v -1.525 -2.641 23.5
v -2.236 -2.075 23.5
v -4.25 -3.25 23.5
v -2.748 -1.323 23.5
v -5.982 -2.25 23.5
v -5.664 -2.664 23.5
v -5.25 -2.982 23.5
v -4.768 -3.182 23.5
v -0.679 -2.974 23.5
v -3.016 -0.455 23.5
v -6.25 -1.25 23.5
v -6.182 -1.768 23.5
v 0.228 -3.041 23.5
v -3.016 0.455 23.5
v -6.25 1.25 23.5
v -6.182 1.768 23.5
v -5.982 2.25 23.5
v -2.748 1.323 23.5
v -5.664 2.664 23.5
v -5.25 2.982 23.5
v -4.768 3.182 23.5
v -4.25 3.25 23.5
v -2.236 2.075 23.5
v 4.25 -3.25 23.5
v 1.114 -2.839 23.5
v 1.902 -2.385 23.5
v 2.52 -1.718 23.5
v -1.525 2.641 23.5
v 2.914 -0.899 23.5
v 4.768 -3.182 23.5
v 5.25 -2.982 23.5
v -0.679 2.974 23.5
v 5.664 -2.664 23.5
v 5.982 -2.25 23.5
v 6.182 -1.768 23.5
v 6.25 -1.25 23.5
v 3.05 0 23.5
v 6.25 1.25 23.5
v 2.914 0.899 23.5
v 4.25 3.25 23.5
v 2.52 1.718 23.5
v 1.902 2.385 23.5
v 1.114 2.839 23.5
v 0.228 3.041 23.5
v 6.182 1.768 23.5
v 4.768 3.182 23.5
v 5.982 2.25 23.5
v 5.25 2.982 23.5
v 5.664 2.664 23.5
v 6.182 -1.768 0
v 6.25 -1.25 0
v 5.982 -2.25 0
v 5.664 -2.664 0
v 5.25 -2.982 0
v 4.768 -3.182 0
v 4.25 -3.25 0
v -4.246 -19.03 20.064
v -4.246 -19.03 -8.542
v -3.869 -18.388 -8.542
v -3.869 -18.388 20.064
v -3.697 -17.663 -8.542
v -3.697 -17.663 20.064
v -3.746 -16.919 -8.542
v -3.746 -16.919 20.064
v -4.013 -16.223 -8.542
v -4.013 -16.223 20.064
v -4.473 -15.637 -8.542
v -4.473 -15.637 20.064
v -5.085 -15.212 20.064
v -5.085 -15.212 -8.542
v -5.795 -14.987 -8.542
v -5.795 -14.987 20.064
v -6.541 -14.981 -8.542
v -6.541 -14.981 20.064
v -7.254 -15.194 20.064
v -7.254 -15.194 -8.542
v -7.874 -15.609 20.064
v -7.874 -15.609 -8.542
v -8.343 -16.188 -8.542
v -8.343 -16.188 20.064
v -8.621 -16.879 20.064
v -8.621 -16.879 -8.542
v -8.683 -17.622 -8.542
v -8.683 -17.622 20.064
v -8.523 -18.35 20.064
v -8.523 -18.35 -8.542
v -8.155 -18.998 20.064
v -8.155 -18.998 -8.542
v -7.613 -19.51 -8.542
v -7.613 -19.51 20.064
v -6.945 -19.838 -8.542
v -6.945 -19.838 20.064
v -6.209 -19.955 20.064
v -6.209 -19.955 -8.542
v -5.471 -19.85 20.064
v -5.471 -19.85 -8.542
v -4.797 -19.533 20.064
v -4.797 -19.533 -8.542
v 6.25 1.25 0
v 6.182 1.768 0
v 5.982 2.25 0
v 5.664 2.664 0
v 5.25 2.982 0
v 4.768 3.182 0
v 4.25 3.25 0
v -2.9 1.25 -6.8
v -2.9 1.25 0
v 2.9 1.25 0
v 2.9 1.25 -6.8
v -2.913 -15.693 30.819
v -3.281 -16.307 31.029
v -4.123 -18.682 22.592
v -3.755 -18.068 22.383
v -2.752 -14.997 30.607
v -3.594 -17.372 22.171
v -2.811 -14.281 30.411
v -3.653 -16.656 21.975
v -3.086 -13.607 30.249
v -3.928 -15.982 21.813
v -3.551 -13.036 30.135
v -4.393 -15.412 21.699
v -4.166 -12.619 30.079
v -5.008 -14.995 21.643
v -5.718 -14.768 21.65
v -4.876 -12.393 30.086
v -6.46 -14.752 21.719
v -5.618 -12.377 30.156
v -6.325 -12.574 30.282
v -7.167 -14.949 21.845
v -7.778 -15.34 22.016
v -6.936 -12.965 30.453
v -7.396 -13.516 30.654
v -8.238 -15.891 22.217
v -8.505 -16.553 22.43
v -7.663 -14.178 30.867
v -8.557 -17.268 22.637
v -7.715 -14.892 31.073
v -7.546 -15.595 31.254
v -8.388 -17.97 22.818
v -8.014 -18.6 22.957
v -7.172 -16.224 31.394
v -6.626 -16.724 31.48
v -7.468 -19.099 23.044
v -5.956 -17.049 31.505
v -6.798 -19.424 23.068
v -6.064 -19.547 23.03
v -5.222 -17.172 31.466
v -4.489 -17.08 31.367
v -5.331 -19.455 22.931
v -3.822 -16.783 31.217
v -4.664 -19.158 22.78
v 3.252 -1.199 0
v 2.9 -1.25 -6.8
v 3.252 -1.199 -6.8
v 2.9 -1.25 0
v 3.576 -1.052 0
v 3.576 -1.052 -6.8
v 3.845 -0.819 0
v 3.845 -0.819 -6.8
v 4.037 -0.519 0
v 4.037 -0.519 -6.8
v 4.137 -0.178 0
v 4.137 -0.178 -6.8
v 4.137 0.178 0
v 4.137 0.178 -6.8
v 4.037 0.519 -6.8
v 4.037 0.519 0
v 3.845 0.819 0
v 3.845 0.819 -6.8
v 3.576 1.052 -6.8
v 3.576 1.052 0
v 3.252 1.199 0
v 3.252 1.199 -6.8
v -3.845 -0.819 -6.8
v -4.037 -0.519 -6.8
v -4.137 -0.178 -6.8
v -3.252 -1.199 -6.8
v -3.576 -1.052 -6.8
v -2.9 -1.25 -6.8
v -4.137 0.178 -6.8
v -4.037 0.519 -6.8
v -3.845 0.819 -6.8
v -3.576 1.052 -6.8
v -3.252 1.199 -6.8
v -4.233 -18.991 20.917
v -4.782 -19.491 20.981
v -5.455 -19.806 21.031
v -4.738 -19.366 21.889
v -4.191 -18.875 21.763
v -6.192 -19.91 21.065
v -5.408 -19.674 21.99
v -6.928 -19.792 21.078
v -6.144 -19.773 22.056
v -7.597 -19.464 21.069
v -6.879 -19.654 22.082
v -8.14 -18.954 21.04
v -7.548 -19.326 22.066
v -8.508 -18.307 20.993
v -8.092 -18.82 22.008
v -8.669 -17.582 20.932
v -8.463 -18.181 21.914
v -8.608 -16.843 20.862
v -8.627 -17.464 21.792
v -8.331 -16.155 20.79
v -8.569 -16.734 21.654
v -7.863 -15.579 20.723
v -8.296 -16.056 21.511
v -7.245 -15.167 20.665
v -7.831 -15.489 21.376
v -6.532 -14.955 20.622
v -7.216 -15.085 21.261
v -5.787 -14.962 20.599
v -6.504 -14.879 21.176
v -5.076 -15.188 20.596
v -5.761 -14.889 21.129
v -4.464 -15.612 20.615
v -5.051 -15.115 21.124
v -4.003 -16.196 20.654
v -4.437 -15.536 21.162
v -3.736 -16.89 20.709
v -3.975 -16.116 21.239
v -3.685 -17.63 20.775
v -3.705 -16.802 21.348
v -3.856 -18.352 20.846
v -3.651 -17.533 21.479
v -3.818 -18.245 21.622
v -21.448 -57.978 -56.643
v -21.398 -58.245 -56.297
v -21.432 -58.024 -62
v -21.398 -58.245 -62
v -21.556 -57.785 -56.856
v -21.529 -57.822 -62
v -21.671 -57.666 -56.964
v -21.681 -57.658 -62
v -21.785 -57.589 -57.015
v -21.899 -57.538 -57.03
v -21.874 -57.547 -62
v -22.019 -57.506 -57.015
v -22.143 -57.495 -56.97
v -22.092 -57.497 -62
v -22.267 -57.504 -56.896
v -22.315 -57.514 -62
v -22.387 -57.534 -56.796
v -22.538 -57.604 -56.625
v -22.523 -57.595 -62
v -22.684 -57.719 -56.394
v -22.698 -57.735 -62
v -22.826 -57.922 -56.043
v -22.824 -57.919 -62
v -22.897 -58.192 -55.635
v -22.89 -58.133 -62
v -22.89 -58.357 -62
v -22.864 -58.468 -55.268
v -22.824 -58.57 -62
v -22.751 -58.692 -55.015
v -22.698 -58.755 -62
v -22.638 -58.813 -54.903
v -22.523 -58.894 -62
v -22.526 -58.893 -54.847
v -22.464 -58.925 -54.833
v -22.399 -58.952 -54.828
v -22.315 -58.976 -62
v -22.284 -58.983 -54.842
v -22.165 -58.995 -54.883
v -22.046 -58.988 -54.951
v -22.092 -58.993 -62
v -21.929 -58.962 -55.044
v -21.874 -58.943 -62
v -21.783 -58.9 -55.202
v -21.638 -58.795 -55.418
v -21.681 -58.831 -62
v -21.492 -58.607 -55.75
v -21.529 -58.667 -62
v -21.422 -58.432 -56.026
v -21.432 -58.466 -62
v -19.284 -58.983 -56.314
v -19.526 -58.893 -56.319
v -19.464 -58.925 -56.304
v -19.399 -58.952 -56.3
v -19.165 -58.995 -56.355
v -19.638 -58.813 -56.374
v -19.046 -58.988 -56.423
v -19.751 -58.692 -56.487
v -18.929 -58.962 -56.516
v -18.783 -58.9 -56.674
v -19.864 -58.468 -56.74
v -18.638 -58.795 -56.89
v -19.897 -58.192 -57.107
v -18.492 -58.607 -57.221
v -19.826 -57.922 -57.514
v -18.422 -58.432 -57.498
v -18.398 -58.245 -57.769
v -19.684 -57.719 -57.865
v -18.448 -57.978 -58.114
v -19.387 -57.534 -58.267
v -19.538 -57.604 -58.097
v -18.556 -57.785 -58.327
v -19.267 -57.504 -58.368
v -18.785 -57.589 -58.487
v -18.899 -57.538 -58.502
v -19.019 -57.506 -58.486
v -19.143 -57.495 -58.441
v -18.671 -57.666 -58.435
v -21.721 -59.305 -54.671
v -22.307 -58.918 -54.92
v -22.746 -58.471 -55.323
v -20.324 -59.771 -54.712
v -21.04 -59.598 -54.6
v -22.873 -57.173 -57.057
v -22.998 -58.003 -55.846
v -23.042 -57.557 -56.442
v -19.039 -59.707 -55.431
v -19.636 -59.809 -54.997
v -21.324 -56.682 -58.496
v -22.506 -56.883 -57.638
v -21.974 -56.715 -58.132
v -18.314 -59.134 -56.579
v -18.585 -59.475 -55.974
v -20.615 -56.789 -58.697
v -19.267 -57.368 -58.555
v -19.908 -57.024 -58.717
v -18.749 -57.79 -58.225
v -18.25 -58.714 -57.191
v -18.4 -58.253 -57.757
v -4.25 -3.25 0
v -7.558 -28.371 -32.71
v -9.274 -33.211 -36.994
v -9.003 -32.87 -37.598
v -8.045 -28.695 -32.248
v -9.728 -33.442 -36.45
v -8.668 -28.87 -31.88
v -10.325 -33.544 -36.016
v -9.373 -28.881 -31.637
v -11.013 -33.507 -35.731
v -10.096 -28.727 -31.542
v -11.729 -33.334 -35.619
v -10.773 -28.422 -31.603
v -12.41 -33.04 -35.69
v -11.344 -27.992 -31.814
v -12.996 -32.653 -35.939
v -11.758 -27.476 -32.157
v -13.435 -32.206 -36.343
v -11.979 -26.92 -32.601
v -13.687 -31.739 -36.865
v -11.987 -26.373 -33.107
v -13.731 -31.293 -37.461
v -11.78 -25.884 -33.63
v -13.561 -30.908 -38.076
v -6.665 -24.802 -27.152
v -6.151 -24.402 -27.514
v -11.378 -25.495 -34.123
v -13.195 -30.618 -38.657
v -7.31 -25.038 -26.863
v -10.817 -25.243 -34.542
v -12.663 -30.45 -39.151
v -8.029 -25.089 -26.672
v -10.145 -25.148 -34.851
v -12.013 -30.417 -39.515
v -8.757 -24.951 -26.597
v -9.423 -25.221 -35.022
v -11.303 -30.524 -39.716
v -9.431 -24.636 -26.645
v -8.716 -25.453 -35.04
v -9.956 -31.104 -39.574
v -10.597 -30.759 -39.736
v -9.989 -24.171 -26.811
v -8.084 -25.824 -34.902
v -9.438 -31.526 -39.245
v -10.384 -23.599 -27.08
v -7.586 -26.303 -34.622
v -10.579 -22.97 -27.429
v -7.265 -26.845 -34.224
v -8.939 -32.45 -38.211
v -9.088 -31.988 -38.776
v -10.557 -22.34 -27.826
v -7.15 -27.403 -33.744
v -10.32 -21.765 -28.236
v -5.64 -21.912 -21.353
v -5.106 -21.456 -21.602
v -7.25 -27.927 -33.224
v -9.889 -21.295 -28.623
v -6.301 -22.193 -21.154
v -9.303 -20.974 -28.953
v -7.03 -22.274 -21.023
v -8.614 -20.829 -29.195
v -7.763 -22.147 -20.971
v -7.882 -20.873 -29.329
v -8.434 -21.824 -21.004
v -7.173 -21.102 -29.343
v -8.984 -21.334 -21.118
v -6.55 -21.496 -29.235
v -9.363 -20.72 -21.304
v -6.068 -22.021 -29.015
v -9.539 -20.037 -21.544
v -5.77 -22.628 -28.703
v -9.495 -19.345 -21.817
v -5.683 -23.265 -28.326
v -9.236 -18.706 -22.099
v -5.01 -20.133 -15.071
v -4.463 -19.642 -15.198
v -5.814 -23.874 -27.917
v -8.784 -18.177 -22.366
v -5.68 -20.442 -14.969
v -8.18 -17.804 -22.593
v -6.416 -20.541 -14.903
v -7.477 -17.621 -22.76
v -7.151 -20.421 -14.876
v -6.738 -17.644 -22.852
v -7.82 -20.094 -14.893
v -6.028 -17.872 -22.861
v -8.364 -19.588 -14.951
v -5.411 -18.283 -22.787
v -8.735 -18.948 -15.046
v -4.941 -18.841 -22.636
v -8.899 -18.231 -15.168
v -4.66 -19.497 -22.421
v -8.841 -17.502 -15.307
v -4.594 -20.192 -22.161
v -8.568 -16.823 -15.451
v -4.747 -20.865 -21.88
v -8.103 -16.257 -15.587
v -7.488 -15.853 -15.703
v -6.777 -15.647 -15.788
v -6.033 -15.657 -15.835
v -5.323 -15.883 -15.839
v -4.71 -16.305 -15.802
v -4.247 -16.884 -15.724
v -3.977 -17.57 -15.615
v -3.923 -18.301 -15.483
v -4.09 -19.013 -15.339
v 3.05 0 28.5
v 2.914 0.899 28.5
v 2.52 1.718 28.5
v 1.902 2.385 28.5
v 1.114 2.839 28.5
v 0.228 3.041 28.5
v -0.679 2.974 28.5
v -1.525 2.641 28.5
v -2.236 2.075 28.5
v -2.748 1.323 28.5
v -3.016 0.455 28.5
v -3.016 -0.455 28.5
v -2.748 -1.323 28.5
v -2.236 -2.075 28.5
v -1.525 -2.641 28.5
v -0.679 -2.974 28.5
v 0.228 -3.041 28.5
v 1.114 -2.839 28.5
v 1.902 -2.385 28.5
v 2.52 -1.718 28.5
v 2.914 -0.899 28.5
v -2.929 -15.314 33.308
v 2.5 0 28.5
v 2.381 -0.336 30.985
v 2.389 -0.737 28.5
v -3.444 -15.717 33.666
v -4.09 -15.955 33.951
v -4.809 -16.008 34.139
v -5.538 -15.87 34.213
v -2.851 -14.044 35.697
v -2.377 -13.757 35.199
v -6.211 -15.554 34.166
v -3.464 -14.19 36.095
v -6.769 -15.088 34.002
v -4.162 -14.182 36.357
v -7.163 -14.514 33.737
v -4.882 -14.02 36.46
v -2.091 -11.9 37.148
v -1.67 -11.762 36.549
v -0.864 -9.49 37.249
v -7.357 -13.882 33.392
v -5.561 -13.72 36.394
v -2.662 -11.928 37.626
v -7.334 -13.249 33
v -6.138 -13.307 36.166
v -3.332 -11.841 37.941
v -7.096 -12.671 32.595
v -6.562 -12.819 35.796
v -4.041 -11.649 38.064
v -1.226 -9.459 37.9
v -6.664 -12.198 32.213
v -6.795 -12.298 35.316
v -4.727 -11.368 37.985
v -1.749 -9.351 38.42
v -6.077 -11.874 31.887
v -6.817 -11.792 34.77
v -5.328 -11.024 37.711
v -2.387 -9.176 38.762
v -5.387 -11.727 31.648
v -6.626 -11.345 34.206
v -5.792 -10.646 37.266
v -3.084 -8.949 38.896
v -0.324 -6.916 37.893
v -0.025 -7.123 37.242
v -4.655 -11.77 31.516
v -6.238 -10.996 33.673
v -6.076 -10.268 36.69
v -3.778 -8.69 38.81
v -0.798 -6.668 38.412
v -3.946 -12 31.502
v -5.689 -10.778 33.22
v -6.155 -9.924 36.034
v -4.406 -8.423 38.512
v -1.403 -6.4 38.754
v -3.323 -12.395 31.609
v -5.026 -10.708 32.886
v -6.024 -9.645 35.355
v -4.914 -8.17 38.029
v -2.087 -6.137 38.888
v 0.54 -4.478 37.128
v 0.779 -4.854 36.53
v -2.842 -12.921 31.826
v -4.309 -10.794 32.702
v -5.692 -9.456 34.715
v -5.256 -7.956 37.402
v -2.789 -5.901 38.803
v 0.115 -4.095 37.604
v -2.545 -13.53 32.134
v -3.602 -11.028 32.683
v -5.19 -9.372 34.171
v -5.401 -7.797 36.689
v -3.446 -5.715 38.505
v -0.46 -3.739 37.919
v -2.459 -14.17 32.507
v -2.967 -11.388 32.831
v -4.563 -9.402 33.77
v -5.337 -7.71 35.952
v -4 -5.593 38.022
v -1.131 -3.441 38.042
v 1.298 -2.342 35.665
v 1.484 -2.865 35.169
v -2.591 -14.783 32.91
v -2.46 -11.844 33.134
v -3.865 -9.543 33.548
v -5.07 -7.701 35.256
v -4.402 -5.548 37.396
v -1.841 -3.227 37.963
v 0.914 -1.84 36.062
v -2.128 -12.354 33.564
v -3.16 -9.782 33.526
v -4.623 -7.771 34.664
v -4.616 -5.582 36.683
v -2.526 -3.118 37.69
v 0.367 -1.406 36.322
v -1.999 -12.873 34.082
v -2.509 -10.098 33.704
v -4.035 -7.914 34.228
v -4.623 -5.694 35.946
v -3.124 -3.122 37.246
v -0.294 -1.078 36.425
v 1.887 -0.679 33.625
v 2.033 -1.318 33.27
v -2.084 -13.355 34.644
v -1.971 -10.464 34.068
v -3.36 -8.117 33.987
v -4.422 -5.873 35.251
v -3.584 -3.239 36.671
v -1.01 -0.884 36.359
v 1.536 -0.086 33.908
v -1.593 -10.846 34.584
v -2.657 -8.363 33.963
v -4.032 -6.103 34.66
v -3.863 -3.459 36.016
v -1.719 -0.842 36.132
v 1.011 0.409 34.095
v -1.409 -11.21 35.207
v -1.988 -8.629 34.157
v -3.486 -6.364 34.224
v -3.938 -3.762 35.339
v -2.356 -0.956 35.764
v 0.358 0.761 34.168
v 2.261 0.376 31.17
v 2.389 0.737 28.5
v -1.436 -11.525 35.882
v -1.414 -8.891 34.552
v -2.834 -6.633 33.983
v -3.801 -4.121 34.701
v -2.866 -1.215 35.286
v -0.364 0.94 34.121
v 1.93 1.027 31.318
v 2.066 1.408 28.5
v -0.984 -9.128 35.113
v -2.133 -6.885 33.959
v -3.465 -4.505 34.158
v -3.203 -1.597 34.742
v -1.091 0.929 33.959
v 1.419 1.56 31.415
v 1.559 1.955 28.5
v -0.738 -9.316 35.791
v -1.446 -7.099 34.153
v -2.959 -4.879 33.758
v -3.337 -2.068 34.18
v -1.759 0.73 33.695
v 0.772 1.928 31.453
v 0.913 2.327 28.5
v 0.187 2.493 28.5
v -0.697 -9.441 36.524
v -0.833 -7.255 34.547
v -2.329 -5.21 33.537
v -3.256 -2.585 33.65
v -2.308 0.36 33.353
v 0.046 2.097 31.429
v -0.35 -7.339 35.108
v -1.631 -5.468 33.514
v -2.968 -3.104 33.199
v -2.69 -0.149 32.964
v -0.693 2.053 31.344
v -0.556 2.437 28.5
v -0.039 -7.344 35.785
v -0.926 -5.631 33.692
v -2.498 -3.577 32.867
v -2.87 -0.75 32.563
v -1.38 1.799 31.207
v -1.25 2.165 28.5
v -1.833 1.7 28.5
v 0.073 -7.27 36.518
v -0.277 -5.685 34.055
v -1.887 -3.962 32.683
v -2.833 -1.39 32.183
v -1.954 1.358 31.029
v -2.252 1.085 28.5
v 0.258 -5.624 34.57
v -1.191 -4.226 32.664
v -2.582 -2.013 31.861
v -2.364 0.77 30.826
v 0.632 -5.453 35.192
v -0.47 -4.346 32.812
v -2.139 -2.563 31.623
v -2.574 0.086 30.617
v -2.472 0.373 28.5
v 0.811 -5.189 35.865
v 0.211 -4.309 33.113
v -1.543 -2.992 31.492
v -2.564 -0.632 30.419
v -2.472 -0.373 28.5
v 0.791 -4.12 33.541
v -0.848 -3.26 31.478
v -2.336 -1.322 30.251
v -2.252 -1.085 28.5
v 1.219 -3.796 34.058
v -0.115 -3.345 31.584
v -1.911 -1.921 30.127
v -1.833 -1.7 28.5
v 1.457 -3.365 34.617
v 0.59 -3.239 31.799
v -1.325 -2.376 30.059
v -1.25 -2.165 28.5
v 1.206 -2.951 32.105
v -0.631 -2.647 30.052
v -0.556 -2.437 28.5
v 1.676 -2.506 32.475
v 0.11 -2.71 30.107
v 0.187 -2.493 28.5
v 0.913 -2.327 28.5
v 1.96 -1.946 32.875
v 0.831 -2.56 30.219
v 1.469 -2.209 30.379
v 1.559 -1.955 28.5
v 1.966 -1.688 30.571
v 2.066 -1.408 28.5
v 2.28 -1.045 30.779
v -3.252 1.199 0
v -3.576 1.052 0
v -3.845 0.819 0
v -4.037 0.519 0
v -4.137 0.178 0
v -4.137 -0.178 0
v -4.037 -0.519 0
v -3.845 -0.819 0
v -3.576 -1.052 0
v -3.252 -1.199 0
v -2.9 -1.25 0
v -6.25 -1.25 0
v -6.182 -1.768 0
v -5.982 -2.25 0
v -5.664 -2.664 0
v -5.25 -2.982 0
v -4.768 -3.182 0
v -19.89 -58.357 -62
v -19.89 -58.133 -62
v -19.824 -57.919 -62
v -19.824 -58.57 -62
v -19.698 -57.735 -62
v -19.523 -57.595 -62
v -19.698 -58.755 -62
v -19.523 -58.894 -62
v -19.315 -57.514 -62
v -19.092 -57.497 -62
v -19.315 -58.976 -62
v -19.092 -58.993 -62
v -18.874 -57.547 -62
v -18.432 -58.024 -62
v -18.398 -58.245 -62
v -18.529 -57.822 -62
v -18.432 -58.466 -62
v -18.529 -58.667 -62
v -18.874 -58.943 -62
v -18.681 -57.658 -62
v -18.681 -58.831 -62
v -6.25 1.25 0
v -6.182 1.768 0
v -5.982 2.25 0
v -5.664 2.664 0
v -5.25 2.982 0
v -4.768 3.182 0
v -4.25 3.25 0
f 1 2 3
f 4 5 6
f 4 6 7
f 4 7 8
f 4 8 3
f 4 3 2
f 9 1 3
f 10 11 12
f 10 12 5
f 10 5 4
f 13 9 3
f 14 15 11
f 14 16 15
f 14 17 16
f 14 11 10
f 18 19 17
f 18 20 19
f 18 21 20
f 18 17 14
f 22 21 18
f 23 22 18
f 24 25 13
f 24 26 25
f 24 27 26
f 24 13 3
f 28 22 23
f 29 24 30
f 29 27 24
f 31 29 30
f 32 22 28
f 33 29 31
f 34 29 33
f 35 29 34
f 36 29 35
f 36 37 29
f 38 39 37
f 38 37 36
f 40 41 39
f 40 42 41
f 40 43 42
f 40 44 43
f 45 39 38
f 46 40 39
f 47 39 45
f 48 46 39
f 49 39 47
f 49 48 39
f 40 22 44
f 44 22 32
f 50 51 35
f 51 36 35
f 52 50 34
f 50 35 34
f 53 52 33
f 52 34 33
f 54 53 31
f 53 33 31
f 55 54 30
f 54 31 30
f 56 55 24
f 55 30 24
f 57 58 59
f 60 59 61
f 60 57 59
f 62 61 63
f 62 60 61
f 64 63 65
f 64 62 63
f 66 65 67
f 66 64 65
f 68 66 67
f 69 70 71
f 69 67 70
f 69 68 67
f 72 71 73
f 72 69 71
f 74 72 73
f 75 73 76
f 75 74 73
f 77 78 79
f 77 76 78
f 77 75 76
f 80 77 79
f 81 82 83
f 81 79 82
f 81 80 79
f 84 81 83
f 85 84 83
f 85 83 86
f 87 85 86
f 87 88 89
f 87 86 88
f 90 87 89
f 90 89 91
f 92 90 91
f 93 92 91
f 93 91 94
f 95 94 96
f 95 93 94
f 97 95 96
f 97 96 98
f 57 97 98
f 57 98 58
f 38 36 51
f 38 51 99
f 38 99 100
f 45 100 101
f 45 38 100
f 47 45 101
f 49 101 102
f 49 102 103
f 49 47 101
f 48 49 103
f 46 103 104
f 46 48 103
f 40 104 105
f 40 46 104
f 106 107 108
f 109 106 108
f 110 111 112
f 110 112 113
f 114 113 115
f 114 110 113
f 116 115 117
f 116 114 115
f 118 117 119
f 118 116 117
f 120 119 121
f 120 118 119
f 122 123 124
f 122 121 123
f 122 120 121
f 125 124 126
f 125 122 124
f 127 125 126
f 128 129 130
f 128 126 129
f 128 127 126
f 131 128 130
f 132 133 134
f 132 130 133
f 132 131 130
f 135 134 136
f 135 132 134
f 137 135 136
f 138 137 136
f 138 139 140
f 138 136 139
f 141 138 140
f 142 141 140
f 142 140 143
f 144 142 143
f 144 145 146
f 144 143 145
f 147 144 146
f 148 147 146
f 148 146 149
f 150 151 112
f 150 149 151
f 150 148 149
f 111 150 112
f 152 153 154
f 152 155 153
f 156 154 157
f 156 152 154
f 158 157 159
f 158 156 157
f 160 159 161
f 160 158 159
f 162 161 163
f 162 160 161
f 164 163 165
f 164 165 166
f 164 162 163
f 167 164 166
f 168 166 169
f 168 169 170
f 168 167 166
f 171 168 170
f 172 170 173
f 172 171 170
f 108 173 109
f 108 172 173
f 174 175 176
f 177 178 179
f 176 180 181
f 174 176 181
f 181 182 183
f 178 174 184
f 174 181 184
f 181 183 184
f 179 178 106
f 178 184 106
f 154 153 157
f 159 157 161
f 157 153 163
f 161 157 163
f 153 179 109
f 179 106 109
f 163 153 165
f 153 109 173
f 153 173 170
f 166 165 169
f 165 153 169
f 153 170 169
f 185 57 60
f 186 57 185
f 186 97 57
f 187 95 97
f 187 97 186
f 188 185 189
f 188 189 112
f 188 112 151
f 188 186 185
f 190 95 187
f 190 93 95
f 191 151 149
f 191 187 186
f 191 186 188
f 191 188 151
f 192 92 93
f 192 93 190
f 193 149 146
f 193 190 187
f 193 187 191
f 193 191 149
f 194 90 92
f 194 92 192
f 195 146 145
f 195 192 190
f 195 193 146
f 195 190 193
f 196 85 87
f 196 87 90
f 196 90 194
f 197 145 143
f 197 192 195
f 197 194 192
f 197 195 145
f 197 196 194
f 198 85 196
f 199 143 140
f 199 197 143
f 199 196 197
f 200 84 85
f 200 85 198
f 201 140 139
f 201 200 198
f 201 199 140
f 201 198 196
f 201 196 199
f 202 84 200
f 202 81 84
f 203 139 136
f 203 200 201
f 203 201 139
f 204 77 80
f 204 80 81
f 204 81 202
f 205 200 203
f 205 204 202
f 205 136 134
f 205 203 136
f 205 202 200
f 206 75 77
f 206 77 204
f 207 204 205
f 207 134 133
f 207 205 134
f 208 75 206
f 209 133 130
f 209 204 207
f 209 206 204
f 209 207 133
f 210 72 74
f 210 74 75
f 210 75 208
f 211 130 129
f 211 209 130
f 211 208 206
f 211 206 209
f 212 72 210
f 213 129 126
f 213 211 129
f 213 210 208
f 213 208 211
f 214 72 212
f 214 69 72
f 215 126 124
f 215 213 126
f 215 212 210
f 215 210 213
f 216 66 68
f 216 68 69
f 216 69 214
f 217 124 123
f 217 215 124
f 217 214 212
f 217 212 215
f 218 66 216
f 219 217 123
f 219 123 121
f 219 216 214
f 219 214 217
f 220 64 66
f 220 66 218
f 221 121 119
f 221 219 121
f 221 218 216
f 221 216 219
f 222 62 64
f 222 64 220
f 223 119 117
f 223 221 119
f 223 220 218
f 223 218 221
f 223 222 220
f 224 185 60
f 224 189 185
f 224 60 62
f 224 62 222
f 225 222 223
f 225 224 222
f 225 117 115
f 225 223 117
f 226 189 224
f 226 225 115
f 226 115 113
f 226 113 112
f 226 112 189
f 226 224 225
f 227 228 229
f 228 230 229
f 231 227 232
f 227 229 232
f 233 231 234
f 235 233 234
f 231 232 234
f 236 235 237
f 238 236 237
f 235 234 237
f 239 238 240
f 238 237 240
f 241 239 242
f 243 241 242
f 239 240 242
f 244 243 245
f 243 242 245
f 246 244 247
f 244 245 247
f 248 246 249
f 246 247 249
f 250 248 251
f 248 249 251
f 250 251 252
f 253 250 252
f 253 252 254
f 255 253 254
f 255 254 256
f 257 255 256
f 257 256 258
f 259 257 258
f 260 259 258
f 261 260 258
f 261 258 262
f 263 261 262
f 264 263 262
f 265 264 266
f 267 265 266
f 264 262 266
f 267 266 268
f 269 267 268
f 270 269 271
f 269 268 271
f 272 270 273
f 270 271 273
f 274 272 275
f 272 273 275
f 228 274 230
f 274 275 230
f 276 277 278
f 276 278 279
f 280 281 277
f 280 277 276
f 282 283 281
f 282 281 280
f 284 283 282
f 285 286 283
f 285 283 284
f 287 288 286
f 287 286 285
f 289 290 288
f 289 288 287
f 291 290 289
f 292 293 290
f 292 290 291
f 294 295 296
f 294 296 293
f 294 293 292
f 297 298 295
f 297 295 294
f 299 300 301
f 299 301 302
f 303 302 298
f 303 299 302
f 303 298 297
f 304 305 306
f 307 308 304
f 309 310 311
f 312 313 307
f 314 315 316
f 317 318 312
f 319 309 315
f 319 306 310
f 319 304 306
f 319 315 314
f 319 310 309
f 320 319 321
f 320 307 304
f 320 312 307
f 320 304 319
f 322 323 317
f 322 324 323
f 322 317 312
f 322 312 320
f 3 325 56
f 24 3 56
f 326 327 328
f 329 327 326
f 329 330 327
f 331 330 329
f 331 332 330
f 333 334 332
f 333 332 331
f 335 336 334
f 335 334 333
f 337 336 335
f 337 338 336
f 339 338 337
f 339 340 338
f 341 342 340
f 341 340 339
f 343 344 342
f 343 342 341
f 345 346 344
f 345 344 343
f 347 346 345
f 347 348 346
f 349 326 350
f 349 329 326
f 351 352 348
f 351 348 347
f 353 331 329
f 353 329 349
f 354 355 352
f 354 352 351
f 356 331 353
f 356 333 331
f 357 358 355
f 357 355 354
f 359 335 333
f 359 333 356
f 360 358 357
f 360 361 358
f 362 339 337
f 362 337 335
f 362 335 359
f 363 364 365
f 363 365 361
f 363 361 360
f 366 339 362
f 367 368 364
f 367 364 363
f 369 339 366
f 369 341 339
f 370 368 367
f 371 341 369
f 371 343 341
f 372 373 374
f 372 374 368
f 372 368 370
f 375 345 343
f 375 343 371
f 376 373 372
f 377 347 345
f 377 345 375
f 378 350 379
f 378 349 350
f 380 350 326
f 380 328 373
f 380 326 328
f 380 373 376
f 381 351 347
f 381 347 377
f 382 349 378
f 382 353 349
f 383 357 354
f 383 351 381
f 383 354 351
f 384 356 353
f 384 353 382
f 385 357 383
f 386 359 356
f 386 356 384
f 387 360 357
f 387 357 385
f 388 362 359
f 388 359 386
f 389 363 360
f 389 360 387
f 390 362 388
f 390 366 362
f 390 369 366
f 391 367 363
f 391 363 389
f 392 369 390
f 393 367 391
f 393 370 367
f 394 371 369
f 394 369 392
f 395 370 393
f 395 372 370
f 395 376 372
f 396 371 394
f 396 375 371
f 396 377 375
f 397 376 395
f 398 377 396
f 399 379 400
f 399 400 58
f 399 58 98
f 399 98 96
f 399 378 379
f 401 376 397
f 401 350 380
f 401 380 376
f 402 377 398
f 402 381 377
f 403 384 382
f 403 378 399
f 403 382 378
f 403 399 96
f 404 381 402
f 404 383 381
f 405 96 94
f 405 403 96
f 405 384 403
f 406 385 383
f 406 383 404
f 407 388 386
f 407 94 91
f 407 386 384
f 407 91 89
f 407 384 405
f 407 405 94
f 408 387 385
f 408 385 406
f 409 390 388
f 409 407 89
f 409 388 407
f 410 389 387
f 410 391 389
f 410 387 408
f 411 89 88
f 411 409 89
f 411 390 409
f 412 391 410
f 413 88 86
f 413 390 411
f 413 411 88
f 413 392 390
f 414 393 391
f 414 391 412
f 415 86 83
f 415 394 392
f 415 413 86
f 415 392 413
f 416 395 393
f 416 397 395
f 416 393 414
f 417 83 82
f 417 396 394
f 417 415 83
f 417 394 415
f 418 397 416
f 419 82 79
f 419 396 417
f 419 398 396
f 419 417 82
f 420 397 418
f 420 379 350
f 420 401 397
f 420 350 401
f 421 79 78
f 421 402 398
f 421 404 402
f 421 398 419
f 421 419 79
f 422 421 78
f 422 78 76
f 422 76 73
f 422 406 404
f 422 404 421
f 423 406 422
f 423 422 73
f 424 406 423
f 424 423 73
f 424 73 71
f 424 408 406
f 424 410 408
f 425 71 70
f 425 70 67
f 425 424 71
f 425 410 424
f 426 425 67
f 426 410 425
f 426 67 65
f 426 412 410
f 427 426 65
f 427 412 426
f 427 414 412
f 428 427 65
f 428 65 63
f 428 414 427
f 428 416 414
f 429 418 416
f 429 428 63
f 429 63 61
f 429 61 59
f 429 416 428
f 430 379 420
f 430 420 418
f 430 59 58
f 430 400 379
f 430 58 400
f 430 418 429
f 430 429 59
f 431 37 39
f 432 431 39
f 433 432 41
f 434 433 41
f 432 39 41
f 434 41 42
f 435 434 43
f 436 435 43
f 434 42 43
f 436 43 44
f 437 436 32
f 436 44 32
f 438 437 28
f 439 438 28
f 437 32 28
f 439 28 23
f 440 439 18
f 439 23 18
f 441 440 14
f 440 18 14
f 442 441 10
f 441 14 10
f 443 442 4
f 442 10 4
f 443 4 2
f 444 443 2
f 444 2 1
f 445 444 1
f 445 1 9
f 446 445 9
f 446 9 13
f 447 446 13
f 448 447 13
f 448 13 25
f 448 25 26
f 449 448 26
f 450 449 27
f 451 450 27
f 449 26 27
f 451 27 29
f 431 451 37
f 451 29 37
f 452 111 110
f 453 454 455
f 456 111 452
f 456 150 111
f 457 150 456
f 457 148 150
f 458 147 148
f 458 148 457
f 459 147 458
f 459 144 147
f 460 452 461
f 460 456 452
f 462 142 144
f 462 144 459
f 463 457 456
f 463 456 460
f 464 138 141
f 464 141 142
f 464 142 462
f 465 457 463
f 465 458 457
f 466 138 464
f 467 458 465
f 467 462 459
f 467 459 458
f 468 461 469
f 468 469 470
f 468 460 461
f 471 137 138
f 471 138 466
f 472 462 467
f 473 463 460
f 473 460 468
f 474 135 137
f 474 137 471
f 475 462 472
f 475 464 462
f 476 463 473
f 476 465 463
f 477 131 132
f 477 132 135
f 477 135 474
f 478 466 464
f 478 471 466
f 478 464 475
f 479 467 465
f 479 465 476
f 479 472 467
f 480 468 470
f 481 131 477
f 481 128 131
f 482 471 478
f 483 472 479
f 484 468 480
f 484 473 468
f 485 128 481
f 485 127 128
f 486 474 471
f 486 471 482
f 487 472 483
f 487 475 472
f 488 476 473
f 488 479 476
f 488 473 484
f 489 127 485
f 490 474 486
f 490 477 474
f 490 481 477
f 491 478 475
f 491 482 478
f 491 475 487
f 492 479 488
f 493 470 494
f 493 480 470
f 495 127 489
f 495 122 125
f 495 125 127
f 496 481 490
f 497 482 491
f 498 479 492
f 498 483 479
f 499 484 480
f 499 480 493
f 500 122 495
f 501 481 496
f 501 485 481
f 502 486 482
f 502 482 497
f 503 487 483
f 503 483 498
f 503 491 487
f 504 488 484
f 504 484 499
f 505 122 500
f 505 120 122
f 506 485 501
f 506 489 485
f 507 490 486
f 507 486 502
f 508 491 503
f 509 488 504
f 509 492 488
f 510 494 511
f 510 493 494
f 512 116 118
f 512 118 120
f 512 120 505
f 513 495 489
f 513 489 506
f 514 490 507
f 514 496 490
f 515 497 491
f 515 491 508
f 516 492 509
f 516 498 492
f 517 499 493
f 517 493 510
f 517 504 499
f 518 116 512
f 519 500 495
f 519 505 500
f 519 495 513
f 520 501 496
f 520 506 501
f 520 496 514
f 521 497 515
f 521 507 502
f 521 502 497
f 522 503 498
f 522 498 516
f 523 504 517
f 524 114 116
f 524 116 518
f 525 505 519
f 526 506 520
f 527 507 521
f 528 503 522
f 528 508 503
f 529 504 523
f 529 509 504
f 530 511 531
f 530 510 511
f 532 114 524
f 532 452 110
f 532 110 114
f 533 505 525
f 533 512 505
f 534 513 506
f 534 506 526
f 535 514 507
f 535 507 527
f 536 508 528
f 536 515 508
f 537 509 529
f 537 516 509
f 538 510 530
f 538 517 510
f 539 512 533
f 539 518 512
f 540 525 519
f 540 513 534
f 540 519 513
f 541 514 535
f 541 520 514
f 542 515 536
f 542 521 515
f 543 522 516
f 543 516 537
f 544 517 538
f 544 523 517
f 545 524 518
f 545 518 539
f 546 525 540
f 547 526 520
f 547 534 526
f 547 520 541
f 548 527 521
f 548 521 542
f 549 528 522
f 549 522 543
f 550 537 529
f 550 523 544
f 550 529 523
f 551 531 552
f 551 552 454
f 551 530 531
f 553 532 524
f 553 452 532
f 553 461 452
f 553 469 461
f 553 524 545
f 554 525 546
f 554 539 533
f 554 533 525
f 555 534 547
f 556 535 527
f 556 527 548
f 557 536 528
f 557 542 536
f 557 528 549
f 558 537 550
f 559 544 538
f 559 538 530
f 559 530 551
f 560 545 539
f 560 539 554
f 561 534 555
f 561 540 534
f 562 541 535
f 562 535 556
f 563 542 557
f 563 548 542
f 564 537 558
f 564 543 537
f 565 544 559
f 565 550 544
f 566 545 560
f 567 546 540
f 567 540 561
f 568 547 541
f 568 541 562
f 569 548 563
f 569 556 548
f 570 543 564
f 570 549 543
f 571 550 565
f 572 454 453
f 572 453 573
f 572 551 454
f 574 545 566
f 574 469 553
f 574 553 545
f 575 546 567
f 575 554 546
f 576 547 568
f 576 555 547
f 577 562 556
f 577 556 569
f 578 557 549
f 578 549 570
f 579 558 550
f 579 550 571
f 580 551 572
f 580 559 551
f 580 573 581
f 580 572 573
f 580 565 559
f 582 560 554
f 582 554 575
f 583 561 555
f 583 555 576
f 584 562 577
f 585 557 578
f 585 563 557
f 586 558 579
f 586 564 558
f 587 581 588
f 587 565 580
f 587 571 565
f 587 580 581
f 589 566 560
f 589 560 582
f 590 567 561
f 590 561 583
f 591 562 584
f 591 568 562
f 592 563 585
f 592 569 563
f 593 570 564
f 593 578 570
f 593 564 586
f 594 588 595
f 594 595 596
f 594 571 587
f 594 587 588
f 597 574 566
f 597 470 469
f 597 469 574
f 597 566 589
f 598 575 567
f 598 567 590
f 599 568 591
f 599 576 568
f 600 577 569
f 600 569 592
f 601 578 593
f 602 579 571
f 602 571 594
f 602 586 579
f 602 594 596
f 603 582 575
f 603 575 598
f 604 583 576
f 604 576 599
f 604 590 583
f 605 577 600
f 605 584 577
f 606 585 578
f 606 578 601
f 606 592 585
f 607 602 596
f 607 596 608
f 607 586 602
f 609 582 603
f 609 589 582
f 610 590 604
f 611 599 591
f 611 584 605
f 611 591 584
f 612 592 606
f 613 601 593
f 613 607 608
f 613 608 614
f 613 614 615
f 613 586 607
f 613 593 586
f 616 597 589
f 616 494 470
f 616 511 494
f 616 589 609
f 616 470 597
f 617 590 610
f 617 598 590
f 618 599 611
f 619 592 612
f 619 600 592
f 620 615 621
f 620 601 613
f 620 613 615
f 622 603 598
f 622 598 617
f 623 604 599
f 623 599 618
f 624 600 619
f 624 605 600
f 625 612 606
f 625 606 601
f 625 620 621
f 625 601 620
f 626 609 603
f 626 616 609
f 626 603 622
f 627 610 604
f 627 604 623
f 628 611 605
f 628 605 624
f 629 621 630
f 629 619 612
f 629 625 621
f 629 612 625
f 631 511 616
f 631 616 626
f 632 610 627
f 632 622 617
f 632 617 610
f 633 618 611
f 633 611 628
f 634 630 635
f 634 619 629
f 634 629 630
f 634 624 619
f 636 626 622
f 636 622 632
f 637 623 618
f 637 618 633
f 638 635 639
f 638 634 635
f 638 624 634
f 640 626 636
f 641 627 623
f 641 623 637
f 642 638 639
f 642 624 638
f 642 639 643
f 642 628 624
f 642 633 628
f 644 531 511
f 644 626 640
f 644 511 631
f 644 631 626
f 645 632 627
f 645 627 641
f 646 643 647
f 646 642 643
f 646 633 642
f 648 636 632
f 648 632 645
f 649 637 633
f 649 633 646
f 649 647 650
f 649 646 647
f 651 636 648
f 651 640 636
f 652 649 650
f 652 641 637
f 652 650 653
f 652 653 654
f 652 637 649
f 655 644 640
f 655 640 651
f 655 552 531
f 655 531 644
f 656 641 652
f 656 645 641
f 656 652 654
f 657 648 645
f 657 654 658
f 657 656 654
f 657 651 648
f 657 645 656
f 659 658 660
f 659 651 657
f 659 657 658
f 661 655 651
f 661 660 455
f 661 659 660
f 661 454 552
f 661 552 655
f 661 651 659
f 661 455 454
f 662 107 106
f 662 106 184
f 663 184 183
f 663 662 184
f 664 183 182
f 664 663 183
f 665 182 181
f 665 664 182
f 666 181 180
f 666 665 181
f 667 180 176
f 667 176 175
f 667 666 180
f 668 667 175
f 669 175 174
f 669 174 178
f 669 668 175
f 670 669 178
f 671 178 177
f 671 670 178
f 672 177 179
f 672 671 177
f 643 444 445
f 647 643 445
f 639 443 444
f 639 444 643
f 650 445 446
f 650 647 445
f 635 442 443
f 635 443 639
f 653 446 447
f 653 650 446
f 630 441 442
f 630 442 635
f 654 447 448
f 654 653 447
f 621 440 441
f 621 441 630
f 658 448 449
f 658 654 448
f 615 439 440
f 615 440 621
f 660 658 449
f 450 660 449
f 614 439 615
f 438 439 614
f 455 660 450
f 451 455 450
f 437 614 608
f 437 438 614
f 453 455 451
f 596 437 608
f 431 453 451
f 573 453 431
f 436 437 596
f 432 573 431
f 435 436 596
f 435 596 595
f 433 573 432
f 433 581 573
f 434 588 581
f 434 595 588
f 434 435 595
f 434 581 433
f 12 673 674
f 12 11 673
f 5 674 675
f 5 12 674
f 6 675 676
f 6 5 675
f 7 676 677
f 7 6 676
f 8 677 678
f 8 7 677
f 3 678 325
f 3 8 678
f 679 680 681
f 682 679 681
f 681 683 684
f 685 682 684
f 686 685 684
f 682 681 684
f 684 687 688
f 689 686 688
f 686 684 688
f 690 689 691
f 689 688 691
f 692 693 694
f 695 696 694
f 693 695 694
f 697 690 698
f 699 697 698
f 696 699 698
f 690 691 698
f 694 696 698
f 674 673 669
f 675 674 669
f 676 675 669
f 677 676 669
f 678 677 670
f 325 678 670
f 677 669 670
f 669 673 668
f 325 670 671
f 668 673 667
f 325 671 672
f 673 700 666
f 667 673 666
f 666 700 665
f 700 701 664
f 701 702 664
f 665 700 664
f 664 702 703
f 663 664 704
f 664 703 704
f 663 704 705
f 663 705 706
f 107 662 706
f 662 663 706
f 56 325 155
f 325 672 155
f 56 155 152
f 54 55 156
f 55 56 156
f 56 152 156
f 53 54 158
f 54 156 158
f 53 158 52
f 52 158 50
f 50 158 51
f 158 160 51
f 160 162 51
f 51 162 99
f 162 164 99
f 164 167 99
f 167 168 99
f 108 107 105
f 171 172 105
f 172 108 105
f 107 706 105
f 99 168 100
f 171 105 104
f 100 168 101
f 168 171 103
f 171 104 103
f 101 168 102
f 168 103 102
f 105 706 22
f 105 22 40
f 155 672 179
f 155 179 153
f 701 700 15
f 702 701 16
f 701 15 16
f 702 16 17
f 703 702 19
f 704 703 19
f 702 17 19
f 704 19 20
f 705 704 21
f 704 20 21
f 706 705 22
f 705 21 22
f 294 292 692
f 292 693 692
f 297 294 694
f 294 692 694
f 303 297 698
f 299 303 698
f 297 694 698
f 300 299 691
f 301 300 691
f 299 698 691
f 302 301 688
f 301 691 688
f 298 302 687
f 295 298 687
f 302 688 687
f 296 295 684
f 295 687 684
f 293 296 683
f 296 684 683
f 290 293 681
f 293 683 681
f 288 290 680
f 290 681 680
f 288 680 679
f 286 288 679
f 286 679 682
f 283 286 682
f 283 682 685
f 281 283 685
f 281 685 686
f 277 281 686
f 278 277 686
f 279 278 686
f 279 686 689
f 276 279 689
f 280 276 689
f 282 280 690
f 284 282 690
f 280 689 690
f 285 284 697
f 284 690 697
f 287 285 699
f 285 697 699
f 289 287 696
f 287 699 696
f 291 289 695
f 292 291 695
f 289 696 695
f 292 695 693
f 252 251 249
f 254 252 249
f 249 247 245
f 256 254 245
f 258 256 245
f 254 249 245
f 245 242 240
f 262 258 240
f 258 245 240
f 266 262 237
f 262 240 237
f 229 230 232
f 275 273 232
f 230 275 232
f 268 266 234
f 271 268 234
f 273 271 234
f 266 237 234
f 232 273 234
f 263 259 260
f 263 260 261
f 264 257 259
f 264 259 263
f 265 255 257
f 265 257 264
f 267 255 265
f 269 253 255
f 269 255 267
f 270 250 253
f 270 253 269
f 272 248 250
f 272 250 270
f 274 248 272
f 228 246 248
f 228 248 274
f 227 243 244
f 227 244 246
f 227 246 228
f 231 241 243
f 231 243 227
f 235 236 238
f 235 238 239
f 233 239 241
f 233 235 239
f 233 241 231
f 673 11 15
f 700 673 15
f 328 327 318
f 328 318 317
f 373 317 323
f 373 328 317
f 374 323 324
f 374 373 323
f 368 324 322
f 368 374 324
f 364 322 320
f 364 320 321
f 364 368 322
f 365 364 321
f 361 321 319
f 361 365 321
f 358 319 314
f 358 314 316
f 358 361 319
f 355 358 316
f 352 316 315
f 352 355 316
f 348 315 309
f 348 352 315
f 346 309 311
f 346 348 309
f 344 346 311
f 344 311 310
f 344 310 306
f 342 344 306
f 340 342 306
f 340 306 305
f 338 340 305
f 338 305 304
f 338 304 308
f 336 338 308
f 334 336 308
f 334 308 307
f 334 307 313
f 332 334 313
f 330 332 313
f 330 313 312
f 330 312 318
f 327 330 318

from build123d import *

# Parameters (mm, degrees)
SKETCH1_W                 = 12.5
SKETCH1_H                 = 6.5
BOSS_EXTRUDE1_DEPTH       = 23.5
SKETCH2_R                 = 3.05
BOSS_EXTRUDE2_DEPTH       = 5
SKETCH3_R                 = 2.5
SKETCH5_W                 = 8.3
SKETCH5_H                 = 2.5
BOSS_EXTRUDE3_DEPTH       = 6.8
FILLET1_RADIUS            = 1.25
FILLET1_LENGTH            = 6.8
FILLET2_RADIUS            = 1.25
FILLET2_LENGTH            = 6.8
FILLET3_R                 = 2
BOSS_EXTRUDE6_START       = -62
BOSS_EXTRUDE6_OUTLINE_R   = 0.75
BOSS_EXTRUDE6_DEPTH       = 4.969882251
BOSS_EXTRUDE6_START_2     = -57.030117749
BOSS_EXTRUDE6_2_OUTLINE_R = 0.75
BOSS_EXTRUDE6_2_DEPTH     = 2.202194261
BOSS_EXTRUDE6_START_3     = -82.97383816
BOSS_EXTRUDE6_3_OUTLINE_W = 5
BOSS_EXTRUDE6_3_OUTLINE_H = 6
BOSS_EXTRUDE6_3_DEPTH     = 1.97383816
BOSS_EXTRUDE6_4_OUTLINE_R = 0.75
BOSS_EXTRUDE6_4_DEPTH     = 3.498218139
BOSS_EXTRUDE6_START_4     = -58.501781861
BOSS_EXTRUDE6_5_OUTLINE_R = 0.75
BOSS_EXTRUDE6_5_DEPTH     = 2.20219426
BOSS_EXTRUDE6_6_OUTLINE_W = 5
BOSS_EXTRUDE6_6_OUTLINE_H = 5
BOSS_EXTRUDE6_6_DEPTH     = 1.97383816


with BuildPart() as part:
    # Sketch1 → Boss-Extrude1 (new body)
    with BuildSketch(Plane.XY):
        Rectangle(SKETCH1_W, SKETCH1_H)
    extrude(amount=BOSS_EXTRUDE1_DEPTH)

    # Sketch2 → Boss-Extrude2 (add)
    with BuildSketch(Plane.XY.offset(23.5)):
        Circle(SKETCH2_R)
    extrude(amount=BOSS_EXTRUDE2_DEPTH)

    # Sweep1: sweep along a path in Sketch4
    with BuildLine(Plane(origin=(0, 0, 0), x_dir=(0, 0, -1), z_dir=(0.9425249130903538, -0.3341358828441223, 0))) as sweep1_path:
        Line((56.664852675, -61.796572691), (37.683956267, -33.930161138))
        ThreePointArc((37.683956267, -33.930161138), (25.024855626, -22.609720048), (8.542155439, -18.52))
        Line((8.542155439, -18.52), (-20.063531525, -18.52))
        ThreePointArc((-20.063531525, -18.52), (-21.220526285, -18.435893072), (-22.353193227, -18.185340781))
        Line((-22.353193227, -18.185340781), (-30.789661702, -15.665340781))
        ThreePointArc((-30.789661702, -15.665340781), (-36.415893072, -6.84300524), (-28.5, 0))
    # Sketch3 → Sweep1 (sweep)
    with BuildSketch(Plane.XY.offset(28.5)):
        Circle(SKETCH3_R)
    sweep(path=sweep1_path.line)

    # Sketch5 → Boss-Extrude3 (add)
    with BuildSketch(Plane.XY):
        Rectangle(SKETCH5_W, SKETCH5_H)
    extrude(amount=-BOSS_EXTRUDE3_DEPTH)

    # Fillet1: full round fillet: the end face becomes a half cylinder, R = half its width
    fillet1_face = Plane((4.15, 0, -3.4), x_dir=(0, 0, 1), z_dir=(1, 0, 0))  # on the end face: x along it, z out of the body
    fillet1_slab = fillet1_face.offset(-FILLET1_RADIUS / 2) * Box(FILLET1_LENGTH, 2 * FILLET1_RADIUS, FILLET1_RADIUS, mode=Mode.PRIVATE)  # the body's end, R deep
    fillet1_round = Plane((2.9, 0, -3.4), x_dir=(1, 0, 0), z_dir=(0, 0, 1)) * Cylinder(FILLET1_RADIUS, FILLET1_LENGTH, mode=Mode.PRIVATE)  # its axis R under the face
    add(fillet1_slab - fillet1_round, mode=Mode.SUBTRACT)

    # Fillet2: full round fillet: the end face becomes a half cylinder, R = half its width
    fillet2_face = Plane((-4.15, 0, -3.4), x_dir=(0, 0, 1), z_dir=(-1, 0, 0))  # on the end face: x along it, z out of the body
    fillet2_slab = fillet2_face.offset(-FILLET2_RADIUS / 2) * Box(FILLET2_LENGTH, 2 * FILLET2_RADIUS, FILLET2_RADIUS, mode=Mode.PRIVATE)  # the body's end, R deep
    fillet2_round = Plane((-2.9, 0, -3.4), x_dir=(-1, 0, 0), z_dir=(0, 0, 1)) * Cylinder(FILLET2_RADIUS, FILLET2_LENGTH, mode=Mode.PRIVATE)  # its axis R under the face
    add(fillet2_slab - fillet2_round, mode=Mode.SUBTRACT)

    # Fillet3
    fillet3_edges = [part.edges().sort_by_distance(p)[0] for p in [
        (6.25, -3.25, 11.75),
        (-6.25, -3.25, 11.75),
        (-6.25, 3.25, 11.75),
        (6.25, 3.25, 11.75),
    ]]
    fillet(fillet3_edges, radius=FILLET3_R)


with BuildPart() as body_2:
    # Boss-Extrude6: read off the stored shape, not the designer's step
    # Boss-Extrude6 outline → Boss-Extrude6 (new body)
    with BuildSketch(Plane.XY.offset(BOSS_EXTRUDE6_START)):
        with Locations((-22.148452373, -58.244809305)):
            Circle(BOSS_EXTRUDE6_OUTLINE_R)
    extrude(amount=BOSS_EXTRUDE6_DEPTH)

    # Boss-Extrude6 2 outline → Boss-Extrude6 2 (add)
    with BuildSketch(Plane.XY.offset(BOSS_EXTRUDE6_START_2)):
        with Locations((-22.148452373, -58.244809305)):
            Circle(BOSS_EXTRUDE6_2_OUTLINE_R)
    extrude(amount=BOSS_EXTRUDE6_2_DEPTH)

    # Boss-Extrude6 3 outline → Boss-Extrude6 3 (cut)
    with BuildSketch(Plane(origin=(0, 0, 0), x_dir=(0.9611118234588524, -0.22382868291463434, -0.1617553198887132), z_dir=(0.276159487991269, 0.7789860675917779, 0.5629535004689981)).offset(BOSS_EXTRUDE6_START_3)):
        with Locations((0.5, 11)):
            Rectangle(BOSS_EXTRUDE6_3_OUTLINE_W, BOSS_EXTRUDE6_3_OUTLINE_H)
    extrude(amount=BOSS_EXTRUDE6_3_DEPTH, mode=Mode.SUBTRACT)


with BuildPart() as body_3:
    # Boss-Extrude6 4 outline → Boss-Extrude6 4 (new body)
    with BuildSketch(Plane.XY.offset(BOSS_EXTRUDE6_START)):
        with Locations((-19.148452373, -58.244809305)):
            Circle(BOSS_EXTRUDE6_4_OUTLINE_R)
    extrude(amount=BOSS_EXTRUDE6_4_DEPTH)

    # Boss-Extrude6 5 outline → Boss-Extrude6 5 (add)
    with BuildSketch(Plane.XY.offset(BOSS_EXTRUDE6_START_4)):
        with Locations((-19.148452373, -58.244809305)):
            Circle(BOSS_EXTRUDE6_5_OUTLINE_R)
    extrude(amount=BOSS_EXTRUDE6_5_DEPTH)

    # Boss-Extrude6 6 outline → Boss-Extrude6 6 (cut)
    with BuildSketch(Plane(origin=(0, 0, 0), x_dir=(0.9611118234588528, -0.22382868291463243, -0.16175531988871258), z_dir=(0.2761594879912671, 0.7789860675917771, 0.5629535004690001)).offset(BOSS_EXTRUDE6_START_3)):
        with Locations((3.5, 12.5)):
            Rectangle(BOSS_EXTRUDE6_6_OUTLINE_W, BOSS_EXTRUDE6_6_OUTLINE_H)
    extrude(amount=BOSS_EXTRUDE6_6_DEPTH, mode=Mode.SUBTRACT)


solid = Compound([part.part, body_2.part, body_3.part])
